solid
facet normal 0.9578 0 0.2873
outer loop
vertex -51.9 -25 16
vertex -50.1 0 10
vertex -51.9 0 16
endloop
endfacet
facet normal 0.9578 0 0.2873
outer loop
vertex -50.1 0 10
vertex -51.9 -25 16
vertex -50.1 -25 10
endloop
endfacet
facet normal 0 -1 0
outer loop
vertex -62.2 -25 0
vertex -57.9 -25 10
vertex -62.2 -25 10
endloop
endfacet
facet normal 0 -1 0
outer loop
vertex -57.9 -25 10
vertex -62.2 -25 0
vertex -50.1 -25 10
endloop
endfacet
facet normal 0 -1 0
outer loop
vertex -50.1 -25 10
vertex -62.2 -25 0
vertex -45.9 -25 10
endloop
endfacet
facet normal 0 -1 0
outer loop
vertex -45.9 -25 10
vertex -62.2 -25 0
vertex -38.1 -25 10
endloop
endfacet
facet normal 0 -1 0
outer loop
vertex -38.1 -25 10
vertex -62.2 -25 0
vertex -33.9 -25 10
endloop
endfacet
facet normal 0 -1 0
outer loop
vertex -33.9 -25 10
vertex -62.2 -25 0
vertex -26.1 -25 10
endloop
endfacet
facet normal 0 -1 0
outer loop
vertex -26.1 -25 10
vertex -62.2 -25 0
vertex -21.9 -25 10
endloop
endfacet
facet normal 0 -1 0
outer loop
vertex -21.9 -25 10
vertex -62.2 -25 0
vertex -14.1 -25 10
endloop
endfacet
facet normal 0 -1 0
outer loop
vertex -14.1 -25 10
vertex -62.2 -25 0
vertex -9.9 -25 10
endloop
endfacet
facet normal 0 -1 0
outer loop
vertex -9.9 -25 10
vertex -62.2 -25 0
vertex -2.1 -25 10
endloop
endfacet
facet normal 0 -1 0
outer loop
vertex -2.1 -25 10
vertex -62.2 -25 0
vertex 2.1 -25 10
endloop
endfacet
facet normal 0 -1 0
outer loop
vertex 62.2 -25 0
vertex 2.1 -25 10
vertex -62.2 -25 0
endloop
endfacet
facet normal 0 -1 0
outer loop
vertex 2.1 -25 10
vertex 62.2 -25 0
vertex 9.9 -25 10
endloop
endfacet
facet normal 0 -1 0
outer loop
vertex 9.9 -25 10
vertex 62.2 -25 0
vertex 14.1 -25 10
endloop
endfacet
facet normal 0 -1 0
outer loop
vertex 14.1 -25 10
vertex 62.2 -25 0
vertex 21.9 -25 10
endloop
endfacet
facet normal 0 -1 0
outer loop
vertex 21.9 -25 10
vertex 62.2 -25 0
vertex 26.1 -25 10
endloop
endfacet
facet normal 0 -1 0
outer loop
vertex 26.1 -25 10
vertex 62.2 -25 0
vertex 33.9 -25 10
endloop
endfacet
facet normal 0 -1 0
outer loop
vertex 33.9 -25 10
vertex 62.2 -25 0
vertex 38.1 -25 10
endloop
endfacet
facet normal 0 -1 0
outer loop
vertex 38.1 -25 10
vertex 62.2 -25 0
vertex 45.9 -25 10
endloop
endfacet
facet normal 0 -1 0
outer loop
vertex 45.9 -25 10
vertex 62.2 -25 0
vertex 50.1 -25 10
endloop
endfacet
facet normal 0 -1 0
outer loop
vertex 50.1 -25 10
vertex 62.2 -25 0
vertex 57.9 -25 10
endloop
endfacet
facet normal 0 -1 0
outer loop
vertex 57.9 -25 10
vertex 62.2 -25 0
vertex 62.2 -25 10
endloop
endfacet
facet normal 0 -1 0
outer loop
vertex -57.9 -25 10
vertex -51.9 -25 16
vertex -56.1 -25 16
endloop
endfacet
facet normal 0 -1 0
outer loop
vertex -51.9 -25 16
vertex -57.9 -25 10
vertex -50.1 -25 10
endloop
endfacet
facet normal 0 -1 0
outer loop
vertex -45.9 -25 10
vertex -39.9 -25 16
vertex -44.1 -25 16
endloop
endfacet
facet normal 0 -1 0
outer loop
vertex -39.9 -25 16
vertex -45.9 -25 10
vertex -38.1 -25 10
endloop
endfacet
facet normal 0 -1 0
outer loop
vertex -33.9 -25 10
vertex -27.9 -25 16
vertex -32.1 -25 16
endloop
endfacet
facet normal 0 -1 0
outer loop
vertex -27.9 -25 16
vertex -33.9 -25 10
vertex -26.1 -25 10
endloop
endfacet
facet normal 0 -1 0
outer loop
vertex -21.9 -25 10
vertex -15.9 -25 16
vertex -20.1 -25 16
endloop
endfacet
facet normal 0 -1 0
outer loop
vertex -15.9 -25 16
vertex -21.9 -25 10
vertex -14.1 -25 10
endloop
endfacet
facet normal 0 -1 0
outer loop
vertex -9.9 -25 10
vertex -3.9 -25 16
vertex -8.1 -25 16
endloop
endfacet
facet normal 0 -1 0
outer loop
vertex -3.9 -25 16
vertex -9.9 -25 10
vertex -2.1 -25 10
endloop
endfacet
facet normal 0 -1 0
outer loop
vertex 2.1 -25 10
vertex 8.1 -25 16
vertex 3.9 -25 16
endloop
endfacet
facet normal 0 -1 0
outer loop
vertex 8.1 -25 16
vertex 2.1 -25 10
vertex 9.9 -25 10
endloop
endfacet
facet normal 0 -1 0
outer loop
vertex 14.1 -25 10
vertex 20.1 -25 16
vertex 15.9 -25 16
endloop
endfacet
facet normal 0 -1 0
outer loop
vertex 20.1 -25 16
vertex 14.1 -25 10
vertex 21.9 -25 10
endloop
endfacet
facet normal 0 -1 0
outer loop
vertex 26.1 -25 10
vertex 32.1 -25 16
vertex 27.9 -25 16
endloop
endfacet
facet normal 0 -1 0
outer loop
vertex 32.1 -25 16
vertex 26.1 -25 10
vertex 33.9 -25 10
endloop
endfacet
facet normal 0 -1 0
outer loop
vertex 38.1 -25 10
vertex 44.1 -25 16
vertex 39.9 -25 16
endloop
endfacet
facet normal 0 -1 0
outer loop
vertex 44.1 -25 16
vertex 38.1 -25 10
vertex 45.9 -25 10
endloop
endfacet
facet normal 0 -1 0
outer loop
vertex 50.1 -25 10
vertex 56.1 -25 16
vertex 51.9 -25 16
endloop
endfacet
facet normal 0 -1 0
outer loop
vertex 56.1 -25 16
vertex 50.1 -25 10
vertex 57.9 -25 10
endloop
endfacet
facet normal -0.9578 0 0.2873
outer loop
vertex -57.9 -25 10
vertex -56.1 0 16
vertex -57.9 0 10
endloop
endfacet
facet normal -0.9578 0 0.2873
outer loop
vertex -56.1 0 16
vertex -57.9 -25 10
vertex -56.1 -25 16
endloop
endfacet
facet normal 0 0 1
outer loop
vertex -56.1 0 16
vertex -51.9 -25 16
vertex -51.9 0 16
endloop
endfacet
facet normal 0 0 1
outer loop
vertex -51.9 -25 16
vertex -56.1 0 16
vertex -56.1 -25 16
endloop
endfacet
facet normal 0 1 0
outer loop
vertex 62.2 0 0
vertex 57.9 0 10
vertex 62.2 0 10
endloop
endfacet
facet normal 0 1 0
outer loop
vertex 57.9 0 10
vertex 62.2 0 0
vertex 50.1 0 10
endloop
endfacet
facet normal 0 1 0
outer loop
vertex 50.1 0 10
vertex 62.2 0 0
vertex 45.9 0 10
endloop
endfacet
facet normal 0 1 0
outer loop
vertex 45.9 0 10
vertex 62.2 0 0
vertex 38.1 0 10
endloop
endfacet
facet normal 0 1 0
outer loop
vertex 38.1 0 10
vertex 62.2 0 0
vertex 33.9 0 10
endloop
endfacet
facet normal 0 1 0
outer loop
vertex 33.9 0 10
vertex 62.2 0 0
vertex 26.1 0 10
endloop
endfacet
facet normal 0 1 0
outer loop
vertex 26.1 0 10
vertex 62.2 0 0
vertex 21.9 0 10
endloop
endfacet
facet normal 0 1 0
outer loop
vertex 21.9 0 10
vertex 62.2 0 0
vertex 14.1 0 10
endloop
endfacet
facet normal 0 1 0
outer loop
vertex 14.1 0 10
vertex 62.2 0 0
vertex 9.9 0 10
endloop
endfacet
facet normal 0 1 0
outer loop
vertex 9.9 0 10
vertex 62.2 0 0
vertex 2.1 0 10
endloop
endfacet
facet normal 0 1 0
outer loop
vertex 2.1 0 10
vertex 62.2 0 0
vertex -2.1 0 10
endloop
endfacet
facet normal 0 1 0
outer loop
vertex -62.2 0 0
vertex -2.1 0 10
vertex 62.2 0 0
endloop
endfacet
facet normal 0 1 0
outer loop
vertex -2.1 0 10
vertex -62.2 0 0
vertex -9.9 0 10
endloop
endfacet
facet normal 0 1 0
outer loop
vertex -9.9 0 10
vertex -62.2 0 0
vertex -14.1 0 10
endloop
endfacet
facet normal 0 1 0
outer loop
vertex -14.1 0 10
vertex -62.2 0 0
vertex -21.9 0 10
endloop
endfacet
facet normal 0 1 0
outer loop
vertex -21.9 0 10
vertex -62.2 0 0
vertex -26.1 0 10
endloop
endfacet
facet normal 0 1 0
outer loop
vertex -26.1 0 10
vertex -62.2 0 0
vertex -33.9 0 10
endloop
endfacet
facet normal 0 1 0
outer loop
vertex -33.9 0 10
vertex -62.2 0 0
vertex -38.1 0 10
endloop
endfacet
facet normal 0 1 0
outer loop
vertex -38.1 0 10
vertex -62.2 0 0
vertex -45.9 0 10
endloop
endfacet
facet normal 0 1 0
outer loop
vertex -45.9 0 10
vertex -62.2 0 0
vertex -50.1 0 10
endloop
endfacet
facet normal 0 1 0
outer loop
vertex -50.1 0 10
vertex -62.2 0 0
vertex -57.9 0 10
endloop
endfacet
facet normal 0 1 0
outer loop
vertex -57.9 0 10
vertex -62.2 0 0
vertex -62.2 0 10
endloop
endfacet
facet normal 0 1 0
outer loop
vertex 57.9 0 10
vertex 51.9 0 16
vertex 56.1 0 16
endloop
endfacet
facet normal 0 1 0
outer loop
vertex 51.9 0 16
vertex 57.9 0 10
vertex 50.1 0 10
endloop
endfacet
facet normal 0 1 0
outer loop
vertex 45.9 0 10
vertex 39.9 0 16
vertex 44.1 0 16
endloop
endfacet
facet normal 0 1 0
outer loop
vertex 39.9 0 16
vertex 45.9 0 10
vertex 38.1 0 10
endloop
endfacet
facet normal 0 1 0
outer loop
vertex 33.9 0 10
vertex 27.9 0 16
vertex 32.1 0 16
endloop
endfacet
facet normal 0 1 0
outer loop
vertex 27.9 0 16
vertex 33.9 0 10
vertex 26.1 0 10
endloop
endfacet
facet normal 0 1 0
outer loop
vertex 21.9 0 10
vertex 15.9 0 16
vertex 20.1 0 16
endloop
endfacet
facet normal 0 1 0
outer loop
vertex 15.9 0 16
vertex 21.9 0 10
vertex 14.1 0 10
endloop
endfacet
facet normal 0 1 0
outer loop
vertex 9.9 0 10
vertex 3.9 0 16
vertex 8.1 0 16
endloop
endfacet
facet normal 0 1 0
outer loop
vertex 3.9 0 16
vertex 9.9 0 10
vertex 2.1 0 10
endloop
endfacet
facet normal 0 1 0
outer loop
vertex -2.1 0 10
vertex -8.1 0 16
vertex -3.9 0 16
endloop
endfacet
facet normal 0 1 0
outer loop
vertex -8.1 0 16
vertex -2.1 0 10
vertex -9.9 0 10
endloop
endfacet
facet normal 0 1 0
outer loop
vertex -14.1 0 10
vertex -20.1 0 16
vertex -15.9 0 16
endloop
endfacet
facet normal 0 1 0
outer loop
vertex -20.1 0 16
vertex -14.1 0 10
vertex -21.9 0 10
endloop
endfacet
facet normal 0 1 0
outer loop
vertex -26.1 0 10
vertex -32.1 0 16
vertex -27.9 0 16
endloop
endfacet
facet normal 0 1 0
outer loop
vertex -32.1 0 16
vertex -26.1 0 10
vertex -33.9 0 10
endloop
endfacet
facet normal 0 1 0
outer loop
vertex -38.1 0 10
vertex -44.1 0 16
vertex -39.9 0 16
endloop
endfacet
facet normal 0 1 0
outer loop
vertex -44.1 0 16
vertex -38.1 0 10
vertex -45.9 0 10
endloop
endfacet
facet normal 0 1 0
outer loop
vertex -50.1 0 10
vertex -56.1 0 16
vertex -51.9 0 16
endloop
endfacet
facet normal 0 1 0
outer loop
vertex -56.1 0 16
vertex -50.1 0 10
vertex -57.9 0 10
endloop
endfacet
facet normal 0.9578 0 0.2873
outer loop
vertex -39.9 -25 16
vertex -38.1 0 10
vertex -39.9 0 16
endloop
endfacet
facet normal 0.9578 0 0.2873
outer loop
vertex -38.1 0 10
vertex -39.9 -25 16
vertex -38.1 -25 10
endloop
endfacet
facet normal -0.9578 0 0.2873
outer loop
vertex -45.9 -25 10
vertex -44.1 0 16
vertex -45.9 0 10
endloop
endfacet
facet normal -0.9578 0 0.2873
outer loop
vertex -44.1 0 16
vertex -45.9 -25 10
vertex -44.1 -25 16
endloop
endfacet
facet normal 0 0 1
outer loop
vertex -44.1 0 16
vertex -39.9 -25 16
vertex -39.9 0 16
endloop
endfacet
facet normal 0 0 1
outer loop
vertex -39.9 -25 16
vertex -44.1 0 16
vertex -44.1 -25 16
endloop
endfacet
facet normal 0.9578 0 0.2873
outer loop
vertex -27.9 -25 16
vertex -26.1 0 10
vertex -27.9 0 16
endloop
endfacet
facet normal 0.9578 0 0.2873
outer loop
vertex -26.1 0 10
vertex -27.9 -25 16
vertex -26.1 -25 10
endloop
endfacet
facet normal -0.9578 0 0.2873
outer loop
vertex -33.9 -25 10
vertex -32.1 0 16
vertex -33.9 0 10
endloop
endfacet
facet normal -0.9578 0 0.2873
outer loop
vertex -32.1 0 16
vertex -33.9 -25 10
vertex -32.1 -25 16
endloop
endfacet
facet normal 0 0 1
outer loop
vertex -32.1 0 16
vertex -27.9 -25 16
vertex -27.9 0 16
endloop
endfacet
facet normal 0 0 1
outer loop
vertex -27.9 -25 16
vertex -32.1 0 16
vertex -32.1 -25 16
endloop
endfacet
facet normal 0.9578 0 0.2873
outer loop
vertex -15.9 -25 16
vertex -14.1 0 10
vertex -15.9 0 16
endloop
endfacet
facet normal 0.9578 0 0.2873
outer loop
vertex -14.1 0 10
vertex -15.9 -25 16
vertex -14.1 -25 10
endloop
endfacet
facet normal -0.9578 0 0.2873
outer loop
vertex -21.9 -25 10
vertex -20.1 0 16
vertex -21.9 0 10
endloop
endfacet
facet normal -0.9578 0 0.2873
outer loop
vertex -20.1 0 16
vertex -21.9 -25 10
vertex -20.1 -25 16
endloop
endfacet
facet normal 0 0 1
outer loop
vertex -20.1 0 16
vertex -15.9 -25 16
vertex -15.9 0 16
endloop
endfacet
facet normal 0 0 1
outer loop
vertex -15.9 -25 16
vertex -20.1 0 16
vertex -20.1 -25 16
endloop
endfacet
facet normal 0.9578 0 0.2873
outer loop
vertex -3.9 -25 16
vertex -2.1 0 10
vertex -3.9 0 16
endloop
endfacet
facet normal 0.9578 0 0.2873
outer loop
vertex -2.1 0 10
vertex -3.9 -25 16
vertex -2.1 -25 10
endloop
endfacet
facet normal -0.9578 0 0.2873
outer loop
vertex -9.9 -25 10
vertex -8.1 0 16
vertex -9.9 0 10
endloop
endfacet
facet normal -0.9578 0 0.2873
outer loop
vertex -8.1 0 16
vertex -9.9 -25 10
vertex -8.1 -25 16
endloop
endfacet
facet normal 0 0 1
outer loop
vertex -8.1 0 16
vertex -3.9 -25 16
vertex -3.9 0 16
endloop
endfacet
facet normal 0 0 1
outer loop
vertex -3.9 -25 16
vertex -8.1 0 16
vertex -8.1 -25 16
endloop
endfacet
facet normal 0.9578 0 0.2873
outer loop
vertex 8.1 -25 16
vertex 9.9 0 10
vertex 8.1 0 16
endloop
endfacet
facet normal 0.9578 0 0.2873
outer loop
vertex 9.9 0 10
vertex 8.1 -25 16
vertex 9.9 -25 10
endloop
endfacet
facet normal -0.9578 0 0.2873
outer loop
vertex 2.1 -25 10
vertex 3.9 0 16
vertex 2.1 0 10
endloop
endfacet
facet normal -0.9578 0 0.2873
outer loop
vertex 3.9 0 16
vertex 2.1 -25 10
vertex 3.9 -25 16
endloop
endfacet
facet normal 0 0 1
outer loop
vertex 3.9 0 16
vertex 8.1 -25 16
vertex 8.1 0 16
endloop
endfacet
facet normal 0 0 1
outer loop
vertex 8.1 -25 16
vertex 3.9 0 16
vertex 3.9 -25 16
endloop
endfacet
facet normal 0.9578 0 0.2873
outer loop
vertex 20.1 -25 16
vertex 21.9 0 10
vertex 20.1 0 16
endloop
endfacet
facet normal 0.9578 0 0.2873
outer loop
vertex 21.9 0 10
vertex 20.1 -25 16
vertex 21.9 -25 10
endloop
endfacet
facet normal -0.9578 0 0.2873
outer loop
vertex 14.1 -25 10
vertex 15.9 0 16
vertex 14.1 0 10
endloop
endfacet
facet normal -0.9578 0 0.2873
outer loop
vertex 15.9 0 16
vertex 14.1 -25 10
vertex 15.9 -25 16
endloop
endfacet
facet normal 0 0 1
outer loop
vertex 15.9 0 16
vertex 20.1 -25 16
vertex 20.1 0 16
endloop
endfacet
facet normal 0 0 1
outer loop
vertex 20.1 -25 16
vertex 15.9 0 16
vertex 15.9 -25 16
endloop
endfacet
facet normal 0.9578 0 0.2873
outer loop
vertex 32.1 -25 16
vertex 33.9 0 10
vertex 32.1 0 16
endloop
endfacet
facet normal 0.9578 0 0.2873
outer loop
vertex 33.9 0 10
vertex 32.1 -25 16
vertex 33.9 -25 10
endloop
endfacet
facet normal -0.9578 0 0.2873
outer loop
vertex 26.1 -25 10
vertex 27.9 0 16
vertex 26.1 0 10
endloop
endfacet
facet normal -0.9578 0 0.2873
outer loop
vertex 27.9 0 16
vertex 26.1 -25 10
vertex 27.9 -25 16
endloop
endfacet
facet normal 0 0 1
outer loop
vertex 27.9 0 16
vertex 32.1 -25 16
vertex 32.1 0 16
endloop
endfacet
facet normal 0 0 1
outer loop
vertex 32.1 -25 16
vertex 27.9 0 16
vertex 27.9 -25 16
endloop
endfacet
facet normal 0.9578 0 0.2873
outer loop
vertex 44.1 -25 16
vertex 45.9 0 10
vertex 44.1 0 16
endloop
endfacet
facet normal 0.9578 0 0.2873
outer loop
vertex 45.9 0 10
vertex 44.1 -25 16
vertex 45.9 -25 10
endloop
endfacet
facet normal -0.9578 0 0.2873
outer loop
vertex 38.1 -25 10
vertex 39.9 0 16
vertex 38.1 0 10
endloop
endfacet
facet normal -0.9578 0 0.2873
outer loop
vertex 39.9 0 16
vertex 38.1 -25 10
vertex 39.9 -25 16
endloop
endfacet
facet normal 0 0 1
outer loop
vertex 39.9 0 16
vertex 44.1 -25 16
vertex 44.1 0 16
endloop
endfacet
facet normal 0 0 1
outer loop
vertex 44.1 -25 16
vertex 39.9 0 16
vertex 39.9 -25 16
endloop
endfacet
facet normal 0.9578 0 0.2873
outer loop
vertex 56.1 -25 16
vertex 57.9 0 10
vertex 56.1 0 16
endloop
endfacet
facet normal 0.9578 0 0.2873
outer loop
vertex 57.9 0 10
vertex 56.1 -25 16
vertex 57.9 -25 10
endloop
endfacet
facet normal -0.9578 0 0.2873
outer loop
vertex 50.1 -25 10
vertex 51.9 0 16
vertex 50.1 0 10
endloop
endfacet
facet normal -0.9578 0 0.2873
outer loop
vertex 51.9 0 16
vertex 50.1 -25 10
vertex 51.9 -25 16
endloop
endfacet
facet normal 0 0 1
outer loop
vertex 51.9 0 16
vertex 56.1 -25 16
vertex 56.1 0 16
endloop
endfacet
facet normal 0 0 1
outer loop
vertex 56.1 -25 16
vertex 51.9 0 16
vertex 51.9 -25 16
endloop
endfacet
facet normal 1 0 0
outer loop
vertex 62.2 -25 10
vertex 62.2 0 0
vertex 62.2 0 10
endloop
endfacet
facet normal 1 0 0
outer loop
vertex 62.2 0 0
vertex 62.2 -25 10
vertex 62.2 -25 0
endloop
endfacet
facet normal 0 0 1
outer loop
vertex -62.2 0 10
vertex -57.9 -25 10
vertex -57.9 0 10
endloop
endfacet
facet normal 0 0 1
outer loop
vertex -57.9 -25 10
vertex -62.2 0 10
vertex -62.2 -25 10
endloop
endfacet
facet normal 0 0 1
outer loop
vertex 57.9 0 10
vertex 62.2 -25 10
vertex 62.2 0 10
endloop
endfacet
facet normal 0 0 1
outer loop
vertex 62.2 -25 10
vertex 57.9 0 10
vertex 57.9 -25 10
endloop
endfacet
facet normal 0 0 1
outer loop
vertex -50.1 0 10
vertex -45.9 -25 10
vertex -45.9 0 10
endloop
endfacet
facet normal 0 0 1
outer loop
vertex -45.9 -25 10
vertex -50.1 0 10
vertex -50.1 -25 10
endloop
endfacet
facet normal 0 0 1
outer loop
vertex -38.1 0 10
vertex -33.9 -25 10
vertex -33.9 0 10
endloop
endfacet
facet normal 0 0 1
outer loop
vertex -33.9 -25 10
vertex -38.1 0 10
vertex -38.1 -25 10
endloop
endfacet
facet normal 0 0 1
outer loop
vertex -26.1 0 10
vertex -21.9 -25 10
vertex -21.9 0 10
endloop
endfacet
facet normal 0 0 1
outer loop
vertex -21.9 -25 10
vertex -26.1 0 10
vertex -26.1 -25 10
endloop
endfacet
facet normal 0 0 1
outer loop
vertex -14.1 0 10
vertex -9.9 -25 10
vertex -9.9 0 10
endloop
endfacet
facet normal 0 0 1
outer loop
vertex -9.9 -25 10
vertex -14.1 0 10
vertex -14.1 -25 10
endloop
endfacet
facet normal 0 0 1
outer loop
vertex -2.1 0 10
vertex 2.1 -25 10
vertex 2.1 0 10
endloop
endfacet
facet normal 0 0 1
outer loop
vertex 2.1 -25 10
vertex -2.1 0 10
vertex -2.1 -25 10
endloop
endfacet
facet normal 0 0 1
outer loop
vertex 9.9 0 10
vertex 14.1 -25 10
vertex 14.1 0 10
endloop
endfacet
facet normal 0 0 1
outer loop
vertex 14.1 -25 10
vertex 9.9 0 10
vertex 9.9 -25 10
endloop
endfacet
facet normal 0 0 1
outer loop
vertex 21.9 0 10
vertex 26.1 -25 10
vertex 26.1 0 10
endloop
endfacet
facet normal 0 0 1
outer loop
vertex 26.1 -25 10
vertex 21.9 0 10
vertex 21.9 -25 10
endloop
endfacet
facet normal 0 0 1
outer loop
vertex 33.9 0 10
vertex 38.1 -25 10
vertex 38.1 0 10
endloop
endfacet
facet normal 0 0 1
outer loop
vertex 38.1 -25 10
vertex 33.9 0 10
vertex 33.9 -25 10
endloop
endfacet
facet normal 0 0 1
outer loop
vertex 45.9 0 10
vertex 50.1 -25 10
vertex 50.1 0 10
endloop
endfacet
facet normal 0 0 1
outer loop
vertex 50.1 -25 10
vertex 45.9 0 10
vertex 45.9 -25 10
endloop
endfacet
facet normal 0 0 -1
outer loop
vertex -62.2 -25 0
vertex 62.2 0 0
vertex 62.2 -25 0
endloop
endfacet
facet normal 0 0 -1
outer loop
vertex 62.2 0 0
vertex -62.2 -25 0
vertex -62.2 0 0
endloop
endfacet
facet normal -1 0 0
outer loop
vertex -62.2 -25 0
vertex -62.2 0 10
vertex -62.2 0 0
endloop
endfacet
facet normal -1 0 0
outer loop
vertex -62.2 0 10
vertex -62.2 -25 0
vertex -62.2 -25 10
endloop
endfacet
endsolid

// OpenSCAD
$fn = 32;

// ----------------------------------------------------------------------
// Toothed rack, 10 teeth
// 12 mm pitch, 6 mm teeth
// ----------------------------------------------------------------------

// --- parameters (mm) ---
bar_w = 25;     // bar width (Y)
bar_h = 10;     // bar height (Z)
teeth = 10;     // number of teeth
pitch = 12;     // tooth pitch
tooth_h = 6;    // tooth height above the bar
root_w = 8.4;   // tooth width at the root
crest_w = 4.2;  // tooth width at the crest

// --- derived feature positions (mm) ---
span = (teeth - 1) * pitch;  // = 108   distance between the outer teeth
bar_l = span + root_w + 8;   // = 124.4   bar length: teeth plus 4 mm at each end
tooth_x = -span / 2;         // = -54   X of the first tooth
height = bar_h + tooth_h;    // = 16   overall height
feature_centers = [
  [tooth_x + 0 * pitch, -bar_w / 2],
  [tooth_x + 1 * pitch, -bar_w / 2],
  [tooth_x + 2 * pitch, -bar_w / 2],
  [tooth_x + 3 * pitch, -bar_w / 2],
  [tooth_x + 4 * pitch, -bar_w / 2],
  [tooth_x + 5 * pitch, -bar_w / 2],
  [tooth_x + 6 * pitch, -bar_w / 2],
  [tooth_x + 7 * pitch, -bar_w / 2],
  [tooth_x + 8 * pitch, -bar_w / 2],
  [tooth_x + 9 * pitch, -bar_w / 2]
];   // tooth centre line, drives the tooth loop

// bar with a rack of teeth, one extruded trapezoium per centre
module rack_tooth() {
  linear_extrude(height = bar_w)
    polygon(points = [
      [0, 0],
      [root_w, 0],
      [root_w / 2 + crest_w / 2, tooth_h + 1],
      [root_w / 2 - crest_w / 2, tooth_h + 1]
    ]);
}

union() {
  translate([-bar_l / 2, -bar_w, 0]) cube([bar_l, bar_w, bar_h]);
  for (centre = feature_centers)
    translate([centre[0] - root_w / 2, 0, bar_h - 1]) rotate([90, 0, 0]) rack_tooth();
}
